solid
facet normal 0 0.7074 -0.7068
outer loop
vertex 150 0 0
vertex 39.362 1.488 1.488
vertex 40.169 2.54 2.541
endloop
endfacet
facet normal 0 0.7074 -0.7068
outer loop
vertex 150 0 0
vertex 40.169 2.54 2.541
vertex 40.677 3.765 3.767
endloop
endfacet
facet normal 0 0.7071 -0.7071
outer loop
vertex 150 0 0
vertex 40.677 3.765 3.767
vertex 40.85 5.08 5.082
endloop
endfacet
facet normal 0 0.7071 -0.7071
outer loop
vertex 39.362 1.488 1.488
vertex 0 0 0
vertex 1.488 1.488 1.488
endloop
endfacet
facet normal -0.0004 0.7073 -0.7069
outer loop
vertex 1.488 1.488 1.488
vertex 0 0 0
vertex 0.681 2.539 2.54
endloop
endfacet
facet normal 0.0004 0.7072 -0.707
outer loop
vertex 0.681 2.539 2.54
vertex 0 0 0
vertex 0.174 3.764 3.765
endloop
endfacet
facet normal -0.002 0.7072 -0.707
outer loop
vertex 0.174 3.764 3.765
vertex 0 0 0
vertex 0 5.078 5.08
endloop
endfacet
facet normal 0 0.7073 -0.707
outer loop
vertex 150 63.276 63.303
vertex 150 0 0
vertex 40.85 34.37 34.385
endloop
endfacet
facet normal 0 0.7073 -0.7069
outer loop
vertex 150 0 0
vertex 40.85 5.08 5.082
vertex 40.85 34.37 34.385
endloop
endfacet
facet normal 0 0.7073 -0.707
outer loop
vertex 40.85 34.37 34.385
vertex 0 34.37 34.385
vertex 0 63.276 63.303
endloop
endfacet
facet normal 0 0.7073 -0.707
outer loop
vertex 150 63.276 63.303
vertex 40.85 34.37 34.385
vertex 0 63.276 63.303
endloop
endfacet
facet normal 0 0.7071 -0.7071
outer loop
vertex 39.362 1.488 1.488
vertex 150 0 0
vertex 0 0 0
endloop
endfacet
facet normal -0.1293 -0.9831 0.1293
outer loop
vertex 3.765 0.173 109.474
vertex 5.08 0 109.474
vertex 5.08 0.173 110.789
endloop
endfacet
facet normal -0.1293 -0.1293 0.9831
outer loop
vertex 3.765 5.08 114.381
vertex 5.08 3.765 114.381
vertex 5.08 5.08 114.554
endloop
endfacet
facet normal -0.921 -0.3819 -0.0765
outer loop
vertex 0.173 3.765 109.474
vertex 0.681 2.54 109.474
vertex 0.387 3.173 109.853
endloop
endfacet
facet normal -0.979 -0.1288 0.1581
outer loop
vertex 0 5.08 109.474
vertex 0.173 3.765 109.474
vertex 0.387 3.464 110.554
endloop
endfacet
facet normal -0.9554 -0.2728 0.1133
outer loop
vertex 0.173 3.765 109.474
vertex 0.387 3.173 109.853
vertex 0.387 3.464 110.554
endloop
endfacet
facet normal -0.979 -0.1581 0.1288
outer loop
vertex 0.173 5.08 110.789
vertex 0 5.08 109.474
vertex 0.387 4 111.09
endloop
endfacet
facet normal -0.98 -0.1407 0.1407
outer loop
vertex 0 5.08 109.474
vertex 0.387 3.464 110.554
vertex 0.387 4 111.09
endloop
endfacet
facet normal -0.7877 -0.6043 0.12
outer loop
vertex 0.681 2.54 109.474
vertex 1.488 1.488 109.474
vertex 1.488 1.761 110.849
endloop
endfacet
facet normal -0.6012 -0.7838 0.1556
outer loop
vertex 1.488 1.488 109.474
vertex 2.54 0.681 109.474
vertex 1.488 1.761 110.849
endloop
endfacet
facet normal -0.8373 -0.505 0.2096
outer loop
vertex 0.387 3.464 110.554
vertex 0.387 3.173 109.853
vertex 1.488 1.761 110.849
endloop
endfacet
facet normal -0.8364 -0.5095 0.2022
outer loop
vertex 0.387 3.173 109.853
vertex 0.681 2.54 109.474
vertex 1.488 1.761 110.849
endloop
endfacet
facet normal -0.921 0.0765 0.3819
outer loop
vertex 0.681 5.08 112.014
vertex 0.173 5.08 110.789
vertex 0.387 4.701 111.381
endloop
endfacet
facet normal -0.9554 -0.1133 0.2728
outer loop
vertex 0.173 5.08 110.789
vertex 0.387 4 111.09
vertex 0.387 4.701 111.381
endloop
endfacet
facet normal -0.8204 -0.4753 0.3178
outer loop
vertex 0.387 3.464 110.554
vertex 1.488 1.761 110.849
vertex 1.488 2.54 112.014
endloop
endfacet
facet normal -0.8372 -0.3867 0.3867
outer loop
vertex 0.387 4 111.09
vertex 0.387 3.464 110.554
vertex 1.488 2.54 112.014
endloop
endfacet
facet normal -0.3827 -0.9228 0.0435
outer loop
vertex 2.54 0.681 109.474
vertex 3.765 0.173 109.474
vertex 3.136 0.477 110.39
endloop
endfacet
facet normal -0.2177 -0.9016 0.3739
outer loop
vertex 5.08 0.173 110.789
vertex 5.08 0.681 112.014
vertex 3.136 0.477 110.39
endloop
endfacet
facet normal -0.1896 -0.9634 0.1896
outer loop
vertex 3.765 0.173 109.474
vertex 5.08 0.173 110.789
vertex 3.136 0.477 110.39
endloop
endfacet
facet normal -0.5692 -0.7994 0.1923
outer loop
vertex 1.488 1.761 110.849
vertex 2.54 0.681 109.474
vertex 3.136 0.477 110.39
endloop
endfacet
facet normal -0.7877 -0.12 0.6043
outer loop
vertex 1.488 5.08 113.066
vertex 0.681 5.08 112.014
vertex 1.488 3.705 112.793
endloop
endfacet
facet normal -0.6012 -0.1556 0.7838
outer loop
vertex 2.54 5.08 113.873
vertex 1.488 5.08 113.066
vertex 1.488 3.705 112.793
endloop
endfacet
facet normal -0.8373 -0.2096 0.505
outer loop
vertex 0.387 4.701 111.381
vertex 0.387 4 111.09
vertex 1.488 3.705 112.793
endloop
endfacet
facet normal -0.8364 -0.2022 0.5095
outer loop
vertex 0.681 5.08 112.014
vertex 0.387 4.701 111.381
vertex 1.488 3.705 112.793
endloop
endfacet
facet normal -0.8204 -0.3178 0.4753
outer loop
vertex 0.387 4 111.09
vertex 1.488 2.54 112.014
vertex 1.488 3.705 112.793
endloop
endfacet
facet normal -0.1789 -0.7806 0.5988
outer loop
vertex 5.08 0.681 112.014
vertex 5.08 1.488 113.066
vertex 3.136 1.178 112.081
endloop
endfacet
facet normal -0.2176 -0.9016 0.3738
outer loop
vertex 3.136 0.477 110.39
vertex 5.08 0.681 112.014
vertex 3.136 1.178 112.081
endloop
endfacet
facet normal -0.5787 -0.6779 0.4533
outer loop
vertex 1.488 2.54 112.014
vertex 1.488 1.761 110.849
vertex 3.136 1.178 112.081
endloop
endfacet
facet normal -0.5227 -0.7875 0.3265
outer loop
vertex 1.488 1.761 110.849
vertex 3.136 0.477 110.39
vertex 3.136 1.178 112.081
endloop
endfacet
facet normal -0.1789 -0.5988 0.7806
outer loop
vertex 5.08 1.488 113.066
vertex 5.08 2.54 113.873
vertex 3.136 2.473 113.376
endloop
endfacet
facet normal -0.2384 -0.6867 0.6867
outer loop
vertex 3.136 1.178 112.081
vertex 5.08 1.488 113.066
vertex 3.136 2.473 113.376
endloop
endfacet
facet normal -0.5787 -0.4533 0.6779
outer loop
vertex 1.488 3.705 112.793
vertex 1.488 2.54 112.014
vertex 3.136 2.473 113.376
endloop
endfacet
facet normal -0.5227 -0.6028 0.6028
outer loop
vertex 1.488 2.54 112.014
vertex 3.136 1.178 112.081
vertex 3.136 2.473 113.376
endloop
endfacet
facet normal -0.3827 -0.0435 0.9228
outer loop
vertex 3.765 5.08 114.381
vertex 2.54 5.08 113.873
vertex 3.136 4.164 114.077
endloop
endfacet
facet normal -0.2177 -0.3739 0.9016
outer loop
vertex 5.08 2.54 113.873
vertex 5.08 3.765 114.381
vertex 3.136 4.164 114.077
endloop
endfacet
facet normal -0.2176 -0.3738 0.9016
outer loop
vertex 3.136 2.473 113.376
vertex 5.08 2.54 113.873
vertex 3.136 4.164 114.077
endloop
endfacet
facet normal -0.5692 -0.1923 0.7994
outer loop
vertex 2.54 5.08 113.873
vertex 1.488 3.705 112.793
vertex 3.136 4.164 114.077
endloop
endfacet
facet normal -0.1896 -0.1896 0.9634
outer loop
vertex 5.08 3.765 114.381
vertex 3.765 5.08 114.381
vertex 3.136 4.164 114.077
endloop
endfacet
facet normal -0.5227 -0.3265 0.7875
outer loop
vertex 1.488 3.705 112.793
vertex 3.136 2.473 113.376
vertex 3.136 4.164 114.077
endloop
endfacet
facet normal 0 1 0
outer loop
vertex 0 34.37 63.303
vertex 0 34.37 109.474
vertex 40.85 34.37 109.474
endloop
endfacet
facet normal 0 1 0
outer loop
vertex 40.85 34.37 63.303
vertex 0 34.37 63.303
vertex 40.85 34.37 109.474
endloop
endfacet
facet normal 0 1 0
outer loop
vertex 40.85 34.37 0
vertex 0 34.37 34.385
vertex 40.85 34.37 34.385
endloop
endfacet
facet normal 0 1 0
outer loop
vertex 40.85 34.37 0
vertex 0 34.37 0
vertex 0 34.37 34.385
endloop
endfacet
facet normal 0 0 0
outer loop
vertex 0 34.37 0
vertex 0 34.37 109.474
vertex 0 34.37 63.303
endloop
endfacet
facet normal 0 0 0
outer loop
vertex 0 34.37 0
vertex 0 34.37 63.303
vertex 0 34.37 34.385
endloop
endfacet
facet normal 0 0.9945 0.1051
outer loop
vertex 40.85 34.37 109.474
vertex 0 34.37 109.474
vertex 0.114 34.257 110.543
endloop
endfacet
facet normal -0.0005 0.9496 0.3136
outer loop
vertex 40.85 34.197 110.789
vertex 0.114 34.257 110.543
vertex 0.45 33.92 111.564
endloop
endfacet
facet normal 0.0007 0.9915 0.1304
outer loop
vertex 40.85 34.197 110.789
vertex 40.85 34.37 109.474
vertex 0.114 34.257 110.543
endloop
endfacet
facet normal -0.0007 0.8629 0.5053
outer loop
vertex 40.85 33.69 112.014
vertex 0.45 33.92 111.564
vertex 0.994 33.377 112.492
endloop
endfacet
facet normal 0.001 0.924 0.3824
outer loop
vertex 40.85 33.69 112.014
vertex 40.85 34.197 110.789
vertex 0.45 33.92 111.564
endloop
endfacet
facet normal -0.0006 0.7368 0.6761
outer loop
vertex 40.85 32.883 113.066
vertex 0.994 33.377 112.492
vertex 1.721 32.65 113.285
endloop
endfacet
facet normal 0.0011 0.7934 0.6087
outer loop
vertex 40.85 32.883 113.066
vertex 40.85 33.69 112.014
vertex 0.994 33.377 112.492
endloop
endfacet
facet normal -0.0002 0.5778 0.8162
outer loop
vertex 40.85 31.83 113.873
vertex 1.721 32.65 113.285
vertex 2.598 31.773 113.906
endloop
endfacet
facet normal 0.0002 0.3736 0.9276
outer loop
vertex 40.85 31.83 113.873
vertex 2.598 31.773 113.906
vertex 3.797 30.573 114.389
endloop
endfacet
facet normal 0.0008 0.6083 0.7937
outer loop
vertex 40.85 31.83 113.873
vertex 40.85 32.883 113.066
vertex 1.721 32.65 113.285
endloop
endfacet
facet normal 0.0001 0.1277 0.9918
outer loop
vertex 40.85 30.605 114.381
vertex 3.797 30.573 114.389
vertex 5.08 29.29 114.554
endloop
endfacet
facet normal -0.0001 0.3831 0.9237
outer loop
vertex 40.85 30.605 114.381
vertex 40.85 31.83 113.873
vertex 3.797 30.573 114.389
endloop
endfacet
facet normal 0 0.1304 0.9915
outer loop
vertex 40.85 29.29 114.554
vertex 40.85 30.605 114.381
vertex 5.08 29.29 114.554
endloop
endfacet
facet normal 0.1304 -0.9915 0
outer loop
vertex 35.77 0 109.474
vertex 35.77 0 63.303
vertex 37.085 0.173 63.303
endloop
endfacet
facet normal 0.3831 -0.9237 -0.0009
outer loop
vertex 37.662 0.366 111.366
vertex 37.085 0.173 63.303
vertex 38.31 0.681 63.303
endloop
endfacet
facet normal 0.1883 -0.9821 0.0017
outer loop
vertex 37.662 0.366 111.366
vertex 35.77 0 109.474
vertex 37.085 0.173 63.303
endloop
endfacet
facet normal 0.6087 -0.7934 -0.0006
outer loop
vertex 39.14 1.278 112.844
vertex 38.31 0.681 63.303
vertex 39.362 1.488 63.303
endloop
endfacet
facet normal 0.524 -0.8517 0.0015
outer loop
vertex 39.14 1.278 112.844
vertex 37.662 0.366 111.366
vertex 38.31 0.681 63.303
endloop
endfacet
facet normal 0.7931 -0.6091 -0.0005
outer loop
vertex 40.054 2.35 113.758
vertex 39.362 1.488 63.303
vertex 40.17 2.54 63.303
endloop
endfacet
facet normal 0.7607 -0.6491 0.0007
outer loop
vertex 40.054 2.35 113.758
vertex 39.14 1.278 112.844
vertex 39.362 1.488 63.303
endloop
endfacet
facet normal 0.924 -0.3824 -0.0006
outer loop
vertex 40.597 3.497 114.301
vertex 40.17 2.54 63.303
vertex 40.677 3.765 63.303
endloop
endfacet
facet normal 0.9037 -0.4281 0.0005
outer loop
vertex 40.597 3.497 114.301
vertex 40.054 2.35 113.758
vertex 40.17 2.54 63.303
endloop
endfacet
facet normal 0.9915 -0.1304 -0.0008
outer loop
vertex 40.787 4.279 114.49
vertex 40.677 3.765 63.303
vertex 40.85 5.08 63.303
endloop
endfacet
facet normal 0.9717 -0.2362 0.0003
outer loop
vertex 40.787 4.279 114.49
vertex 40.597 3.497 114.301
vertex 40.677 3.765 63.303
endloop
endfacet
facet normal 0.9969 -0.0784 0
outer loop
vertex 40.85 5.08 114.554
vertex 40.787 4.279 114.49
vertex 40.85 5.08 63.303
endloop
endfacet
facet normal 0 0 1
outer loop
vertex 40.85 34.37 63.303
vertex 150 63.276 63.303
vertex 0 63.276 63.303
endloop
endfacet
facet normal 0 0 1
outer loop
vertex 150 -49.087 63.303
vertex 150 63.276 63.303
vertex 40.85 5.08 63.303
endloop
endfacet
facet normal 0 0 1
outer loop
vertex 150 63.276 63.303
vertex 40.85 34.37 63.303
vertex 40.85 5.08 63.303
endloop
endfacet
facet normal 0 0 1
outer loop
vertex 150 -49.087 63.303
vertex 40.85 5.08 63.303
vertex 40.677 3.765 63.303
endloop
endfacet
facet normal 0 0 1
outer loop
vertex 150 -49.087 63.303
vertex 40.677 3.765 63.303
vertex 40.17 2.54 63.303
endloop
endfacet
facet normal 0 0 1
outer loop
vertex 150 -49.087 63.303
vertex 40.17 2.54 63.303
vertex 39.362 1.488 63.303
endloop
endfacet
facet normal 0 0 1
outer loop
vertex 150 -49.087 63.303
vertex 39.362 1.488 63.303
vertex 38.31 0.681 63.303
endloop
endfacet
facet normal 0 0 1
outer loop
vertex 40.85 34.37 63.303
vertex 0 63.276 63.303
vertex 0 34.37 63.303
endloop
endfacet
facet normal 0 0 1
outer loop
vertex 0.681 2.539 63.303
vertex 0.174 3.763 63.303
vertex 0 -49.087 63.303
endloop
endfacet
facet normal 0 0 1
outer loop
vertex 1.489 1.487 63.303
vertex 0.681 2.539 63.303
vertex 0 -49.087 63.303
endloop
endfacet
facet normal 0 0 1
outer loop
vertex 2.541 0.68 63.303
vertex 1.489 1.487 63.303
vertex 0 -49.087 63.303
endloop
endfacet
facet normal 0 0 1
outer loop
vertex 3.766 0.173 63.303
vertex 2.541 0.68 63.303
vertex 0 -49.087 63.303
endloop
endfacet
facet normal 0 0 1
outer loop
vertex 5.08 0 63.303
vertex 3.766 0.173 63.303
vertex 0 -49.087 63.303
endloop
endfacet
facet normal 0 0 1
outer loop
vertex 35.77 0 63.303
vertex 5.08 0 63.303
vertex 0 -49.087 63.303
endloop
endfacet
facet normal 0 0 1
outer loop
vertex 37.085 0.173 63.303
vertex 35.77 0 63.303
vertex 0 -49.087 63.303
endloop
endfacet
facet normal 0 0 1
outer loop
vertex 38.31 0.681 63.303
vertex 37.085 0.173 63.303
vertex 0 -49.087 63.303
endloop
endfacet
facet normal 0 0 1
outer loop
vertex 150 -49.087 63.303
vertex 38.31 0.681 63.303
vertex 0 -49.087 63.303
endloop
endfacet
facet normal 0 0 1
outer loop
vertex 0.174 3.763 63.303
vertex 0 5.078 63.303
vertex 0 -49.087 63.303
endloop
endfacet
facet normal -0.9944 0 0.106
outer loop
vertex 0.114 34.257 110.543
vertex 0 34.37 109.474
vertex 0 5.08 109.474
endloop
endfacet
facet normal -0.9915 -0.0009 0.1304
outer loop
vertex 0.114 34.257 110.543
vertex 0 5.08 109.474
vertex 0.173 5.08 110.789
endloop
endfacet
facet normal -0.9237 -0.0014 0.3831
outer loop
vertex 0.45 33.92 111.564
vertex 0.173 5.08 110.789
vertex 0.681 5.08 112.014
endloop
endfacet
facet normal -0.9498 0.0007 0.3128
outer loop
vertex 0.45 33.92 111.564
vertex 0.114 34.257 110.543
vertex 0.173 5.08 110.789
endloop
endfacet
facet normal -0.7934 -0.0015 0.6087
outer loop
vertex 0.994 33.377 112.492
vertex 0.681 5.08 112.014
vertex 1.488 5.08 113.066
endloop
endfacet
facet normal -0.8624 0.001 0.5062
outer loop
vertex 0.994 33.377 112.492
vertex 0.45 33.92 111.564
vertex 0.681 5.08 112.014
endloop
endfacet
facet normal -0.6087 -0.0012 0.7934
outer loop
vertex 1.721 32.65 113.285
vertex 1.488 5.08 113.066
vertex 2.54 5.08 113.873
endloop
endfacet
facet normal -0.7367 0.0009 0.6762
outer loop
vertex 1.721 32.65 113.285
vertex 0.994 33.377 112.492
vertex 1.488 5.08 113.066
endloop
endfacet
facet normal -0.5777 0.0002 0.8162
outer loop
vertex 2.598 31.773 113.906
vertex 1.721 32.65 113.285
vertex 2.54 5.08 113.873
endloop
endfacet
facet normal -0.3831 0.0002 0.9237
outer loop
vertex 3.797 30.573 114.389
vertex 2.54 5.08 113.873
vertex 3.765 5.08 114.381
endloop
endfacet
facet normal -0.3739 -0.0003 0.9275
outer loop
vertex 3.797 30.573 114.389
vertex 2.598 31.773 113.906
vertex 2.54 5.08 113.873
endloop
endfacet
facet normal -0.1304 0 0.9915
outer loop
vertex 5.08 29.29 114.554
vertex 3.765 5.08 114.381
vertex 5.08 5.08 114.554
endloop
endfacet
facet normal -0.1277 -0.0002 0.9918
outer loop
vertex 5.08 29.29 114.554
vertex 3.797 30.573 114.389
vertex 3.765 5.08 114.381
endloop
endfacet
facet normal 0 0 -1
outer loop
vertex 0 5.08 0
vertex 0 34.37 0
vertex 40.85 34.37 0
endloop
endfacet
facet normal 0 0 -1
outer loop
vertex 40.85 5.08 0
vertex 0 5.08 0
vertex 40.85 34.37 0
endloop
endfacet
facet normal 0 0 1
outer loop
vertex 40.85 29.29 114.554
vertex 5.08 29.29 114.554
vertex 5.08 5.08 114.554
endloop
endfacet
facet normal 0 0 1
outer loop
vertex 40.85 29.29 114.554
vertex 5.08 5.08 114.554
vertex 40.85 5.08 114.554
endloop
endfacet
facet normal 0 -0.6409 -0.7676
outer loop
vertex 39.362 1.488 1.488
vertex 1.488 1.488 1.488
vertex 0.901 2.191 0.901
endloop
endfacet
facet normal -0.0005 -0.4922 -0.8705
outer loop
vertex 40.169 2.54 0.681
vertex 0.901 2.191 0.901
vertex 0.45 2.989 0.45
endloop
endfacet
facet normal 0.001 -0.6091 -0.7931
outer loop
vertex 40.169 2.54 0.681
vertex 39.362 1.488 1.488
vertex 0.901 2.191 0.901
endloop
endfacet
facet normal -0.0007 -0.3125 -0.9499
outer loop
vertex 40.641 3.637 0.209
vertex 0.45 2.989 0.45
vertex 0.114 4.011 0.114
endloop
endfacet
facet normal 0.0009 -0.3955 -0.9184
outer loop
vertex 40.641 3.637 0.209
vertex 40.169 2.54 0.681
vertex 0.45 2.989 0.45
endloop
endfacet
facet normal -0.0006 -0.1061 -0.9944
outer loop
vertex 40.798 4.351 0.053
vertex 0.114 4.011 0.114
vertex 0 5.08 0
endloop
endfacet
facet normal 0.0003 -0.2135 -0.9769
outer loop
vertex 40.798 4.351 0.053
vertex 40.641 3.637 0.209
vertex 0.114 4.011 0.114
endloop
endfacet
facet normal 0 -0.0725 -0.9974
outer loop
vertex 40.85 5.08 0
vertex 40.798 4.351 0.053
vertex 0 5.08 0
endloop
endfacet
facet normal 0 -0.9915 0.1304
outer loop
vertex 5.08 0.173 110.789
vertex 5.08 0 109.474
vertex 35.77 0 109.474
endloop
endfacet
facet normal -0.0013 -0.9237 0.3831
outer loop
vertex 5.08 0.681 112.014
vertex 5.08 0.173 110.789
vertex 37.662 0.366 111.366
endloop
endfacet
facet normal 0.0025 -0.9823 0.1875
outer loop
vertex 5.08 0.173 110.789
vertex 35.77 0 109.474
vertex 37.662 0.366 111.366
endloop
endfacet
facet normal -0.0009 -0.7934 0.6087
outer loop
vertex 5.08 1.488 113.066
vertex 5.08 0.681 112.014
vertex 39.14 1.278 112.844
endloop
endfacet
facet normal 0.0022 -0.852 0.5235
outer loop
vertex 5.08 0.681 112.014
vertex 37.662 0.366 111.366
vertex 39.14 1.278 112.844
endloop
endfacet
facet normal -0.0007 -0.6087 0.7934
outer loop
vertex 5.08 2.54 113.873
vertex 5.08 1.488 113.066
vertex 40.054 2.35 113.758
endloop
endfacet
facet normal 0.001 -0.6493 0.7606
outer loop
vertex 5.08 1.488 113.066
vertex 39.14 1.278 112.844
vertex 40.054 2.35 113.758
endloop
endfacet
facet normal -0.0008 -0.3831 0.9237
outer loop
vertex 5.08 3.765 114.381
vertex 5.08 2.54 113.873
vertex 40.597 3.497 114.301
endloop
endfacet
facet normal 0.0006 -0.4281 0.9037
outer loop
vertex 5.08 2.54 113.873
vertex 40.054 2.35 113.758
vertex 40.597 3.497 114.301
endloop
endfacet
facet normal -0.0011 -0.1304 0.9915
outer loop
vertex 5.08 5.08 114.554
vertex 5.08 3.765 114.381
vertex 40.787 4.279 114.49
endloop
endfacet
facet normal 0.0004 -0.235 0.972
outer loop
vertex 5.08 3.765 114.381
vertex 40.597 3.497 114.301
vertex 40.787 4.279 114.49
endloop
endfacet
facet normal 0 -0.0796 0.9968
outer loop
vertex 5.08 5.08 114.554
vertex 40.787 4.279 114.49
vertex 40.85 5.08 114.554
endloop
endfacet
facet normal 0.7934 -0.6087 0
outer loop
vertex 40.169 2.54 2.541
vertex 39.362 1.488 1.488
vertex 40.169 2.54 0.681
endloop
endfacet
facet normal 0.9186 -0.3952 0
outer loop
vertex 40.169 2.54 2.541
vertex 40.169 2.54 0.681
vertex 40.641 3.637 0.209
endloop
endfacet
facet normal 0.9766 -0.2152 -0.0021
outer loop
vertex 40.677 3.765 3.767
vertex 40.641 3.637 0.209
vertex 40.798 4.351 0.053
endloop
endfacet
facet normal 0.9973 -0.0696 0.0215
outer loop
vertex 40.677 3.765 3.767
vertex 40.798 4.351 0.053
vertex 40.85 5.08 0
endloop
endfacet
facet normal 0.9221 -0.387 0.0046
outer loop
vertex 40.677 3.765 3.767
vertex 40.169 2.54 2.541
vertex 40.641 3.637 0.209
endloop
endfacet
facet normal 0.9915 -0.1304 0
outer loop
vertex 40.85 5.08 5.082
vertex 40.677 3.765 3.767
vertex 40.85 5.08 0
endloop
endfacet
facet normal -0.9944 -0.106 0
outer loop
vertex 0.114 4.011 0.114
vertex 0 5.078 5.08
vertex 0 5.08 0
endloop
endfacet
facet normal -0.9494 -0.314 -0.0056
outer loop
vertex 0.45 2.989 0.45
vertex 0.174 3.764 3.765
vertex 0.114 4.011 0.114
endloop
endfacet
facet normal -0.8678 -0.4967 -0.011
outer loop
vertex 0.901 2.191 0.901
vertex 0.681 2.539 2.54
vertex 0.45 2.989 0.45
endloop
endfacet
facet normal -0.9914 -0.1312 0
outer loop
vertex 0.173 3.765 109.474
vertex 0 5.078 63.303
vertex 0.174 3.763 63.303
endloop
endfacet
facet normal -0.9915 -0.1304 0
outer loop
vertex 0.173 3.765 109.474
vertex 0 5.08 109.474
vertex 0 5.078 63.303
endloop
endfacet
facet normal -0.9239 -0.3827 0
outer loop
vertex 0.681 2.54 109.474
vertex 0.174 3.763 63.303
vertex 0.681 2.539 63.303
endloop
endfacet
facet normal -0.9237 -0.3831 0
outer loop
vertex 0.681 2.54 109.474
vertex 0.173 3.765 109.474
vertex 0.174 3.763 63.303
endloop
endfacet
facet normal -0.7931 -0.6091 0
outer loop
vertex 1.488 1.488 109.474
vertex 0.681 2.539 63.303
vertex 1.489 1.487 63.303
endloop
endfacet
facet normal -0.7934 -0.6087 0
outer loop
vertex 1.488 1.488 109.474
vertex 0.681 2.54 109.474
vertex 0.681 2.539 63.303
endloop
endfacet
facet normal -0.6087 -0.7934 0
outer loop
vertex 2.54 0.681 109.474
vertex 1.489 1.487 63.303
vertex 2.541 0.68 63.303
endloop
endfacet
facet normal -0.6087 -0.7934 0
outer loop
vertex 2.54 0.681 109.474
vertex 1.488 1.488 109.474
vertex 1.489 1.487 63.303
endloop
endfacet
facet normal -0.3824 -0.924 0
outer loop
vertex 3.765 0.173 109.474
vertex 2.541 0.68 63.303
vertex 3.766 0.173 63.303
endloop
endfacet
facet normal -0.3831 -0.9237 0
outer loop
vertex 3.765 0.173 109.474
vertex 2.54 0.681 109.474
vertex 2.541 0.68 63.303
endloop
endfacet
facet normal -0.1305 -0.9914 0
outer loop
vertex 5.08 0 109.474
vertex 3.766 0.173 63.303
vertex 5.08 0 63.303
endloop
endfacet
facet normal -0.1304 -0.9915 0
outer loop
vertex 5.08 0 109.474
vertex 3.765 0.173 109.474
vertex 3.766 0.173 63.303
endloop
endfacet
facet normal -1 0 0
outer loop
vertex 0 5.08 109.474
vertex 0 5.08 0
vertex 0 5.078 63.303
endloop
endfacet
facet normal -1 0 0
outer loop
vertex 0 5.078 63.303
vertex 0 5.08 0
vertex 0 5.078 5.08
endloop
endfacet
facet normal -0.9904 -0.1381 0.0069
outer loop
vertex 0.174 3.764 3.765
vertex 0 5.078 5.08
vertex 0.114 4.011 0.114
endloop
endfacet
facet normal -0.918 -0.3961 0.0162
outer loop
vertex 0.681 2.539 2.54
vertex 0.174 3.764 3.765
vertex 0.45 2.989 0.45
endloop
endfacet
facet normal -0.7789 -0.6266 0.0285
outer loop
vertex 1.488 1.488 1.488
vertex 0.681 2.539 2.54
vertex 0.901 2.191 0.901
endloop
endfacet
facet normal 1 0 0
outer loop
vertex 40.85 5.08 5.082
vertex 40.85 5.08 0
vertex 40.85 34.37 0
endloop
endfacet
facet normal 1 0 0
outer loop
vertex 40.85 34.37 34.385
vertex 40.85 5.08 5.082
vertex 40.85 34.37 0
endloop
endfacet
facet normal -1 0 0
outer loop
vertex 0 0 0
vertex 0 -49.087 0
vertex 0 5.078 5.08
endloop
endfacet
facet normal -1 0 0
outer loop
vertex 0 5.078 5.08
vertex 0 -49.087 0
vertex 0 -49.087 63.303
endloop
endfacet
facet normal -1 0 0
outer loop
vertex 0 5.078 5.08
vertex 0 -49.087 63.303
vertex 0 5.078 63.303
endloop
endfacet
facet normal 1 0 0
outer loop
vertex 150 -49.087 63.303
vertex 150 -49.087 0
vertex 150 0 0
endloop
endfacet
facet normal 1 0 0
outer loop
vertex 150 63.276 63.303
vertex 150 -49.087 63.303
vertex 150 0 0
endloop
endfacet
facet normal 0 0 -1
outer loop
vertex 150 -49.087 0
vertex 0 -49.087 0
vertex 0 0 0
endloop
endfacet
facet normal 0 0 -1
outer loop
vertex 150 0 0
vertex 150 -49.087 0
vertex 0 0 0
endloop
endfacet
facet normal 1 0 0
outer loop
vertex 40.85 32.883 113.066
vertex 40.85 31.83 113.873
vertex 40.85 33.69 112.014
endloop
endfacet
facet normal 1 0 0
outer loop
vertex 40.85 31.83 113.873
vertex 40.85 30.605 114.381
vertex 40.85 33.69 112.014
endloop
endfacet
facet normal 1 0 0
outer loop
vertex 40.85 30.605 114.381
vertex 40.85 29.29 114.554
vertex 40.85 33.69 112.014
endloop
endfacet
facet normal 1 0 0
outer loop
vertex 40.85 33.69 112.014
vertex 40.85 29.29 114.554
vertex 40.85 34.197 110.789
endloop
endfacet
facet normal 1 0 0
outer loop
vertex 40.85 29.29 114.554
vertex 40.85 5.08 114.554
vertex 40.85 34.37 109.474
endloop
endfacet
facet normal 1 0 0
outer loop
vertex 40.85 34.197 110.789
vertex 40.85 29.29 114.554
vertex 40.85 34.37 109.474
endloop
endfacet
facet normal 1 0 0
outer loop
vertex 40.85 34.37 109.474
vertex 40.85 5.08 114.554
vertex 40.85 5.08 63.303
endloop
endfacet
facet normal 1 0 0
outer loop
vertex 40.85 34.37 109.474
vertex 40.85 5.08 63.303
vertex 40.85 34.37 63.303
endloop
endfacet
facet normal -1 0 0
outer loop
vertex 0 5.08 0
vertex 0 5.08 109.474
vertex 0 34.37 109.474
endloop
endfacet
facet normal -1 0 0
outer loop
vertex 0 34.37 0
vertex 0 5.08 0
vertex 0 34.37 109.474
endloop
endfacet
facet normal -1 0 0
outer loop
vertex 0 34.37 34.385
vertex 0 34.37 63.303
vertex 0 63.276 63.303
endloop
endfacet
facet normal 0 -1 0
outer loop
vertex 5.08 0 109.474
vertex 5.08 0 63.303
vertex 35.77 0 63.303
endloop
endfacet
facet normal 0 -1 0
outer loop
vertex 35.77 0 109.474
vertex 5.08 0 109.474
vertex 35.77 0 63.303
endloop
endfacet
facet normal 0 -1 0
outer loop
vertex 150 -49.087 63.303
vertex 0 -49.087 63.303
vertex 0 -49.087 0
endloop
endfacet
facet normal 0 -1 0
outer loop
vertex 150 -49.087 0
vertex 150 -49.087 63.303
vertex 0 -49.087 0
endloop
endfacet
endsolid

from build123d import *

# Parameters (mm, degrees)
F0_W     = 40.850177
F0_H     = 34.370493
F1_DEPTH = 114.554
F2_R     = 5.08
F4_DEPTH = 150


with BuildPart() as f1:
    # F0 (on Top) → F1 (new body)
    with BuildSketch(Plane.XY):
        with Locations((20.425088, 17.185246)):
            Rectangle(F0_W, F0_H)
    extrude(amount=F1_DEPTH)

    # F2
    f2_edges = [f1.edges().sort_by_distance(p)[0] for p in [
        (20.425089, 0, 114.554),
        (20.425089, 34.370493, 114.554),
        (0, 0, 57.277),
        (0, 17.185247, 114.554),
        (40.850177, 0, 57.277),
        (20.425089, 0, 0),
    ]]
    fillet(f2_edges, radius=F2_R)

    # F3 (on Right) → F4 (join)
    with BuildSketch(Plane.YZ):
        Polygon((-49.08682, 0), (0, 0), (63.275978, 63.303202), (-49.08682, 63.303202), align=None)
    extrude(amount=F4_DEPTH)


solid = f1.part
